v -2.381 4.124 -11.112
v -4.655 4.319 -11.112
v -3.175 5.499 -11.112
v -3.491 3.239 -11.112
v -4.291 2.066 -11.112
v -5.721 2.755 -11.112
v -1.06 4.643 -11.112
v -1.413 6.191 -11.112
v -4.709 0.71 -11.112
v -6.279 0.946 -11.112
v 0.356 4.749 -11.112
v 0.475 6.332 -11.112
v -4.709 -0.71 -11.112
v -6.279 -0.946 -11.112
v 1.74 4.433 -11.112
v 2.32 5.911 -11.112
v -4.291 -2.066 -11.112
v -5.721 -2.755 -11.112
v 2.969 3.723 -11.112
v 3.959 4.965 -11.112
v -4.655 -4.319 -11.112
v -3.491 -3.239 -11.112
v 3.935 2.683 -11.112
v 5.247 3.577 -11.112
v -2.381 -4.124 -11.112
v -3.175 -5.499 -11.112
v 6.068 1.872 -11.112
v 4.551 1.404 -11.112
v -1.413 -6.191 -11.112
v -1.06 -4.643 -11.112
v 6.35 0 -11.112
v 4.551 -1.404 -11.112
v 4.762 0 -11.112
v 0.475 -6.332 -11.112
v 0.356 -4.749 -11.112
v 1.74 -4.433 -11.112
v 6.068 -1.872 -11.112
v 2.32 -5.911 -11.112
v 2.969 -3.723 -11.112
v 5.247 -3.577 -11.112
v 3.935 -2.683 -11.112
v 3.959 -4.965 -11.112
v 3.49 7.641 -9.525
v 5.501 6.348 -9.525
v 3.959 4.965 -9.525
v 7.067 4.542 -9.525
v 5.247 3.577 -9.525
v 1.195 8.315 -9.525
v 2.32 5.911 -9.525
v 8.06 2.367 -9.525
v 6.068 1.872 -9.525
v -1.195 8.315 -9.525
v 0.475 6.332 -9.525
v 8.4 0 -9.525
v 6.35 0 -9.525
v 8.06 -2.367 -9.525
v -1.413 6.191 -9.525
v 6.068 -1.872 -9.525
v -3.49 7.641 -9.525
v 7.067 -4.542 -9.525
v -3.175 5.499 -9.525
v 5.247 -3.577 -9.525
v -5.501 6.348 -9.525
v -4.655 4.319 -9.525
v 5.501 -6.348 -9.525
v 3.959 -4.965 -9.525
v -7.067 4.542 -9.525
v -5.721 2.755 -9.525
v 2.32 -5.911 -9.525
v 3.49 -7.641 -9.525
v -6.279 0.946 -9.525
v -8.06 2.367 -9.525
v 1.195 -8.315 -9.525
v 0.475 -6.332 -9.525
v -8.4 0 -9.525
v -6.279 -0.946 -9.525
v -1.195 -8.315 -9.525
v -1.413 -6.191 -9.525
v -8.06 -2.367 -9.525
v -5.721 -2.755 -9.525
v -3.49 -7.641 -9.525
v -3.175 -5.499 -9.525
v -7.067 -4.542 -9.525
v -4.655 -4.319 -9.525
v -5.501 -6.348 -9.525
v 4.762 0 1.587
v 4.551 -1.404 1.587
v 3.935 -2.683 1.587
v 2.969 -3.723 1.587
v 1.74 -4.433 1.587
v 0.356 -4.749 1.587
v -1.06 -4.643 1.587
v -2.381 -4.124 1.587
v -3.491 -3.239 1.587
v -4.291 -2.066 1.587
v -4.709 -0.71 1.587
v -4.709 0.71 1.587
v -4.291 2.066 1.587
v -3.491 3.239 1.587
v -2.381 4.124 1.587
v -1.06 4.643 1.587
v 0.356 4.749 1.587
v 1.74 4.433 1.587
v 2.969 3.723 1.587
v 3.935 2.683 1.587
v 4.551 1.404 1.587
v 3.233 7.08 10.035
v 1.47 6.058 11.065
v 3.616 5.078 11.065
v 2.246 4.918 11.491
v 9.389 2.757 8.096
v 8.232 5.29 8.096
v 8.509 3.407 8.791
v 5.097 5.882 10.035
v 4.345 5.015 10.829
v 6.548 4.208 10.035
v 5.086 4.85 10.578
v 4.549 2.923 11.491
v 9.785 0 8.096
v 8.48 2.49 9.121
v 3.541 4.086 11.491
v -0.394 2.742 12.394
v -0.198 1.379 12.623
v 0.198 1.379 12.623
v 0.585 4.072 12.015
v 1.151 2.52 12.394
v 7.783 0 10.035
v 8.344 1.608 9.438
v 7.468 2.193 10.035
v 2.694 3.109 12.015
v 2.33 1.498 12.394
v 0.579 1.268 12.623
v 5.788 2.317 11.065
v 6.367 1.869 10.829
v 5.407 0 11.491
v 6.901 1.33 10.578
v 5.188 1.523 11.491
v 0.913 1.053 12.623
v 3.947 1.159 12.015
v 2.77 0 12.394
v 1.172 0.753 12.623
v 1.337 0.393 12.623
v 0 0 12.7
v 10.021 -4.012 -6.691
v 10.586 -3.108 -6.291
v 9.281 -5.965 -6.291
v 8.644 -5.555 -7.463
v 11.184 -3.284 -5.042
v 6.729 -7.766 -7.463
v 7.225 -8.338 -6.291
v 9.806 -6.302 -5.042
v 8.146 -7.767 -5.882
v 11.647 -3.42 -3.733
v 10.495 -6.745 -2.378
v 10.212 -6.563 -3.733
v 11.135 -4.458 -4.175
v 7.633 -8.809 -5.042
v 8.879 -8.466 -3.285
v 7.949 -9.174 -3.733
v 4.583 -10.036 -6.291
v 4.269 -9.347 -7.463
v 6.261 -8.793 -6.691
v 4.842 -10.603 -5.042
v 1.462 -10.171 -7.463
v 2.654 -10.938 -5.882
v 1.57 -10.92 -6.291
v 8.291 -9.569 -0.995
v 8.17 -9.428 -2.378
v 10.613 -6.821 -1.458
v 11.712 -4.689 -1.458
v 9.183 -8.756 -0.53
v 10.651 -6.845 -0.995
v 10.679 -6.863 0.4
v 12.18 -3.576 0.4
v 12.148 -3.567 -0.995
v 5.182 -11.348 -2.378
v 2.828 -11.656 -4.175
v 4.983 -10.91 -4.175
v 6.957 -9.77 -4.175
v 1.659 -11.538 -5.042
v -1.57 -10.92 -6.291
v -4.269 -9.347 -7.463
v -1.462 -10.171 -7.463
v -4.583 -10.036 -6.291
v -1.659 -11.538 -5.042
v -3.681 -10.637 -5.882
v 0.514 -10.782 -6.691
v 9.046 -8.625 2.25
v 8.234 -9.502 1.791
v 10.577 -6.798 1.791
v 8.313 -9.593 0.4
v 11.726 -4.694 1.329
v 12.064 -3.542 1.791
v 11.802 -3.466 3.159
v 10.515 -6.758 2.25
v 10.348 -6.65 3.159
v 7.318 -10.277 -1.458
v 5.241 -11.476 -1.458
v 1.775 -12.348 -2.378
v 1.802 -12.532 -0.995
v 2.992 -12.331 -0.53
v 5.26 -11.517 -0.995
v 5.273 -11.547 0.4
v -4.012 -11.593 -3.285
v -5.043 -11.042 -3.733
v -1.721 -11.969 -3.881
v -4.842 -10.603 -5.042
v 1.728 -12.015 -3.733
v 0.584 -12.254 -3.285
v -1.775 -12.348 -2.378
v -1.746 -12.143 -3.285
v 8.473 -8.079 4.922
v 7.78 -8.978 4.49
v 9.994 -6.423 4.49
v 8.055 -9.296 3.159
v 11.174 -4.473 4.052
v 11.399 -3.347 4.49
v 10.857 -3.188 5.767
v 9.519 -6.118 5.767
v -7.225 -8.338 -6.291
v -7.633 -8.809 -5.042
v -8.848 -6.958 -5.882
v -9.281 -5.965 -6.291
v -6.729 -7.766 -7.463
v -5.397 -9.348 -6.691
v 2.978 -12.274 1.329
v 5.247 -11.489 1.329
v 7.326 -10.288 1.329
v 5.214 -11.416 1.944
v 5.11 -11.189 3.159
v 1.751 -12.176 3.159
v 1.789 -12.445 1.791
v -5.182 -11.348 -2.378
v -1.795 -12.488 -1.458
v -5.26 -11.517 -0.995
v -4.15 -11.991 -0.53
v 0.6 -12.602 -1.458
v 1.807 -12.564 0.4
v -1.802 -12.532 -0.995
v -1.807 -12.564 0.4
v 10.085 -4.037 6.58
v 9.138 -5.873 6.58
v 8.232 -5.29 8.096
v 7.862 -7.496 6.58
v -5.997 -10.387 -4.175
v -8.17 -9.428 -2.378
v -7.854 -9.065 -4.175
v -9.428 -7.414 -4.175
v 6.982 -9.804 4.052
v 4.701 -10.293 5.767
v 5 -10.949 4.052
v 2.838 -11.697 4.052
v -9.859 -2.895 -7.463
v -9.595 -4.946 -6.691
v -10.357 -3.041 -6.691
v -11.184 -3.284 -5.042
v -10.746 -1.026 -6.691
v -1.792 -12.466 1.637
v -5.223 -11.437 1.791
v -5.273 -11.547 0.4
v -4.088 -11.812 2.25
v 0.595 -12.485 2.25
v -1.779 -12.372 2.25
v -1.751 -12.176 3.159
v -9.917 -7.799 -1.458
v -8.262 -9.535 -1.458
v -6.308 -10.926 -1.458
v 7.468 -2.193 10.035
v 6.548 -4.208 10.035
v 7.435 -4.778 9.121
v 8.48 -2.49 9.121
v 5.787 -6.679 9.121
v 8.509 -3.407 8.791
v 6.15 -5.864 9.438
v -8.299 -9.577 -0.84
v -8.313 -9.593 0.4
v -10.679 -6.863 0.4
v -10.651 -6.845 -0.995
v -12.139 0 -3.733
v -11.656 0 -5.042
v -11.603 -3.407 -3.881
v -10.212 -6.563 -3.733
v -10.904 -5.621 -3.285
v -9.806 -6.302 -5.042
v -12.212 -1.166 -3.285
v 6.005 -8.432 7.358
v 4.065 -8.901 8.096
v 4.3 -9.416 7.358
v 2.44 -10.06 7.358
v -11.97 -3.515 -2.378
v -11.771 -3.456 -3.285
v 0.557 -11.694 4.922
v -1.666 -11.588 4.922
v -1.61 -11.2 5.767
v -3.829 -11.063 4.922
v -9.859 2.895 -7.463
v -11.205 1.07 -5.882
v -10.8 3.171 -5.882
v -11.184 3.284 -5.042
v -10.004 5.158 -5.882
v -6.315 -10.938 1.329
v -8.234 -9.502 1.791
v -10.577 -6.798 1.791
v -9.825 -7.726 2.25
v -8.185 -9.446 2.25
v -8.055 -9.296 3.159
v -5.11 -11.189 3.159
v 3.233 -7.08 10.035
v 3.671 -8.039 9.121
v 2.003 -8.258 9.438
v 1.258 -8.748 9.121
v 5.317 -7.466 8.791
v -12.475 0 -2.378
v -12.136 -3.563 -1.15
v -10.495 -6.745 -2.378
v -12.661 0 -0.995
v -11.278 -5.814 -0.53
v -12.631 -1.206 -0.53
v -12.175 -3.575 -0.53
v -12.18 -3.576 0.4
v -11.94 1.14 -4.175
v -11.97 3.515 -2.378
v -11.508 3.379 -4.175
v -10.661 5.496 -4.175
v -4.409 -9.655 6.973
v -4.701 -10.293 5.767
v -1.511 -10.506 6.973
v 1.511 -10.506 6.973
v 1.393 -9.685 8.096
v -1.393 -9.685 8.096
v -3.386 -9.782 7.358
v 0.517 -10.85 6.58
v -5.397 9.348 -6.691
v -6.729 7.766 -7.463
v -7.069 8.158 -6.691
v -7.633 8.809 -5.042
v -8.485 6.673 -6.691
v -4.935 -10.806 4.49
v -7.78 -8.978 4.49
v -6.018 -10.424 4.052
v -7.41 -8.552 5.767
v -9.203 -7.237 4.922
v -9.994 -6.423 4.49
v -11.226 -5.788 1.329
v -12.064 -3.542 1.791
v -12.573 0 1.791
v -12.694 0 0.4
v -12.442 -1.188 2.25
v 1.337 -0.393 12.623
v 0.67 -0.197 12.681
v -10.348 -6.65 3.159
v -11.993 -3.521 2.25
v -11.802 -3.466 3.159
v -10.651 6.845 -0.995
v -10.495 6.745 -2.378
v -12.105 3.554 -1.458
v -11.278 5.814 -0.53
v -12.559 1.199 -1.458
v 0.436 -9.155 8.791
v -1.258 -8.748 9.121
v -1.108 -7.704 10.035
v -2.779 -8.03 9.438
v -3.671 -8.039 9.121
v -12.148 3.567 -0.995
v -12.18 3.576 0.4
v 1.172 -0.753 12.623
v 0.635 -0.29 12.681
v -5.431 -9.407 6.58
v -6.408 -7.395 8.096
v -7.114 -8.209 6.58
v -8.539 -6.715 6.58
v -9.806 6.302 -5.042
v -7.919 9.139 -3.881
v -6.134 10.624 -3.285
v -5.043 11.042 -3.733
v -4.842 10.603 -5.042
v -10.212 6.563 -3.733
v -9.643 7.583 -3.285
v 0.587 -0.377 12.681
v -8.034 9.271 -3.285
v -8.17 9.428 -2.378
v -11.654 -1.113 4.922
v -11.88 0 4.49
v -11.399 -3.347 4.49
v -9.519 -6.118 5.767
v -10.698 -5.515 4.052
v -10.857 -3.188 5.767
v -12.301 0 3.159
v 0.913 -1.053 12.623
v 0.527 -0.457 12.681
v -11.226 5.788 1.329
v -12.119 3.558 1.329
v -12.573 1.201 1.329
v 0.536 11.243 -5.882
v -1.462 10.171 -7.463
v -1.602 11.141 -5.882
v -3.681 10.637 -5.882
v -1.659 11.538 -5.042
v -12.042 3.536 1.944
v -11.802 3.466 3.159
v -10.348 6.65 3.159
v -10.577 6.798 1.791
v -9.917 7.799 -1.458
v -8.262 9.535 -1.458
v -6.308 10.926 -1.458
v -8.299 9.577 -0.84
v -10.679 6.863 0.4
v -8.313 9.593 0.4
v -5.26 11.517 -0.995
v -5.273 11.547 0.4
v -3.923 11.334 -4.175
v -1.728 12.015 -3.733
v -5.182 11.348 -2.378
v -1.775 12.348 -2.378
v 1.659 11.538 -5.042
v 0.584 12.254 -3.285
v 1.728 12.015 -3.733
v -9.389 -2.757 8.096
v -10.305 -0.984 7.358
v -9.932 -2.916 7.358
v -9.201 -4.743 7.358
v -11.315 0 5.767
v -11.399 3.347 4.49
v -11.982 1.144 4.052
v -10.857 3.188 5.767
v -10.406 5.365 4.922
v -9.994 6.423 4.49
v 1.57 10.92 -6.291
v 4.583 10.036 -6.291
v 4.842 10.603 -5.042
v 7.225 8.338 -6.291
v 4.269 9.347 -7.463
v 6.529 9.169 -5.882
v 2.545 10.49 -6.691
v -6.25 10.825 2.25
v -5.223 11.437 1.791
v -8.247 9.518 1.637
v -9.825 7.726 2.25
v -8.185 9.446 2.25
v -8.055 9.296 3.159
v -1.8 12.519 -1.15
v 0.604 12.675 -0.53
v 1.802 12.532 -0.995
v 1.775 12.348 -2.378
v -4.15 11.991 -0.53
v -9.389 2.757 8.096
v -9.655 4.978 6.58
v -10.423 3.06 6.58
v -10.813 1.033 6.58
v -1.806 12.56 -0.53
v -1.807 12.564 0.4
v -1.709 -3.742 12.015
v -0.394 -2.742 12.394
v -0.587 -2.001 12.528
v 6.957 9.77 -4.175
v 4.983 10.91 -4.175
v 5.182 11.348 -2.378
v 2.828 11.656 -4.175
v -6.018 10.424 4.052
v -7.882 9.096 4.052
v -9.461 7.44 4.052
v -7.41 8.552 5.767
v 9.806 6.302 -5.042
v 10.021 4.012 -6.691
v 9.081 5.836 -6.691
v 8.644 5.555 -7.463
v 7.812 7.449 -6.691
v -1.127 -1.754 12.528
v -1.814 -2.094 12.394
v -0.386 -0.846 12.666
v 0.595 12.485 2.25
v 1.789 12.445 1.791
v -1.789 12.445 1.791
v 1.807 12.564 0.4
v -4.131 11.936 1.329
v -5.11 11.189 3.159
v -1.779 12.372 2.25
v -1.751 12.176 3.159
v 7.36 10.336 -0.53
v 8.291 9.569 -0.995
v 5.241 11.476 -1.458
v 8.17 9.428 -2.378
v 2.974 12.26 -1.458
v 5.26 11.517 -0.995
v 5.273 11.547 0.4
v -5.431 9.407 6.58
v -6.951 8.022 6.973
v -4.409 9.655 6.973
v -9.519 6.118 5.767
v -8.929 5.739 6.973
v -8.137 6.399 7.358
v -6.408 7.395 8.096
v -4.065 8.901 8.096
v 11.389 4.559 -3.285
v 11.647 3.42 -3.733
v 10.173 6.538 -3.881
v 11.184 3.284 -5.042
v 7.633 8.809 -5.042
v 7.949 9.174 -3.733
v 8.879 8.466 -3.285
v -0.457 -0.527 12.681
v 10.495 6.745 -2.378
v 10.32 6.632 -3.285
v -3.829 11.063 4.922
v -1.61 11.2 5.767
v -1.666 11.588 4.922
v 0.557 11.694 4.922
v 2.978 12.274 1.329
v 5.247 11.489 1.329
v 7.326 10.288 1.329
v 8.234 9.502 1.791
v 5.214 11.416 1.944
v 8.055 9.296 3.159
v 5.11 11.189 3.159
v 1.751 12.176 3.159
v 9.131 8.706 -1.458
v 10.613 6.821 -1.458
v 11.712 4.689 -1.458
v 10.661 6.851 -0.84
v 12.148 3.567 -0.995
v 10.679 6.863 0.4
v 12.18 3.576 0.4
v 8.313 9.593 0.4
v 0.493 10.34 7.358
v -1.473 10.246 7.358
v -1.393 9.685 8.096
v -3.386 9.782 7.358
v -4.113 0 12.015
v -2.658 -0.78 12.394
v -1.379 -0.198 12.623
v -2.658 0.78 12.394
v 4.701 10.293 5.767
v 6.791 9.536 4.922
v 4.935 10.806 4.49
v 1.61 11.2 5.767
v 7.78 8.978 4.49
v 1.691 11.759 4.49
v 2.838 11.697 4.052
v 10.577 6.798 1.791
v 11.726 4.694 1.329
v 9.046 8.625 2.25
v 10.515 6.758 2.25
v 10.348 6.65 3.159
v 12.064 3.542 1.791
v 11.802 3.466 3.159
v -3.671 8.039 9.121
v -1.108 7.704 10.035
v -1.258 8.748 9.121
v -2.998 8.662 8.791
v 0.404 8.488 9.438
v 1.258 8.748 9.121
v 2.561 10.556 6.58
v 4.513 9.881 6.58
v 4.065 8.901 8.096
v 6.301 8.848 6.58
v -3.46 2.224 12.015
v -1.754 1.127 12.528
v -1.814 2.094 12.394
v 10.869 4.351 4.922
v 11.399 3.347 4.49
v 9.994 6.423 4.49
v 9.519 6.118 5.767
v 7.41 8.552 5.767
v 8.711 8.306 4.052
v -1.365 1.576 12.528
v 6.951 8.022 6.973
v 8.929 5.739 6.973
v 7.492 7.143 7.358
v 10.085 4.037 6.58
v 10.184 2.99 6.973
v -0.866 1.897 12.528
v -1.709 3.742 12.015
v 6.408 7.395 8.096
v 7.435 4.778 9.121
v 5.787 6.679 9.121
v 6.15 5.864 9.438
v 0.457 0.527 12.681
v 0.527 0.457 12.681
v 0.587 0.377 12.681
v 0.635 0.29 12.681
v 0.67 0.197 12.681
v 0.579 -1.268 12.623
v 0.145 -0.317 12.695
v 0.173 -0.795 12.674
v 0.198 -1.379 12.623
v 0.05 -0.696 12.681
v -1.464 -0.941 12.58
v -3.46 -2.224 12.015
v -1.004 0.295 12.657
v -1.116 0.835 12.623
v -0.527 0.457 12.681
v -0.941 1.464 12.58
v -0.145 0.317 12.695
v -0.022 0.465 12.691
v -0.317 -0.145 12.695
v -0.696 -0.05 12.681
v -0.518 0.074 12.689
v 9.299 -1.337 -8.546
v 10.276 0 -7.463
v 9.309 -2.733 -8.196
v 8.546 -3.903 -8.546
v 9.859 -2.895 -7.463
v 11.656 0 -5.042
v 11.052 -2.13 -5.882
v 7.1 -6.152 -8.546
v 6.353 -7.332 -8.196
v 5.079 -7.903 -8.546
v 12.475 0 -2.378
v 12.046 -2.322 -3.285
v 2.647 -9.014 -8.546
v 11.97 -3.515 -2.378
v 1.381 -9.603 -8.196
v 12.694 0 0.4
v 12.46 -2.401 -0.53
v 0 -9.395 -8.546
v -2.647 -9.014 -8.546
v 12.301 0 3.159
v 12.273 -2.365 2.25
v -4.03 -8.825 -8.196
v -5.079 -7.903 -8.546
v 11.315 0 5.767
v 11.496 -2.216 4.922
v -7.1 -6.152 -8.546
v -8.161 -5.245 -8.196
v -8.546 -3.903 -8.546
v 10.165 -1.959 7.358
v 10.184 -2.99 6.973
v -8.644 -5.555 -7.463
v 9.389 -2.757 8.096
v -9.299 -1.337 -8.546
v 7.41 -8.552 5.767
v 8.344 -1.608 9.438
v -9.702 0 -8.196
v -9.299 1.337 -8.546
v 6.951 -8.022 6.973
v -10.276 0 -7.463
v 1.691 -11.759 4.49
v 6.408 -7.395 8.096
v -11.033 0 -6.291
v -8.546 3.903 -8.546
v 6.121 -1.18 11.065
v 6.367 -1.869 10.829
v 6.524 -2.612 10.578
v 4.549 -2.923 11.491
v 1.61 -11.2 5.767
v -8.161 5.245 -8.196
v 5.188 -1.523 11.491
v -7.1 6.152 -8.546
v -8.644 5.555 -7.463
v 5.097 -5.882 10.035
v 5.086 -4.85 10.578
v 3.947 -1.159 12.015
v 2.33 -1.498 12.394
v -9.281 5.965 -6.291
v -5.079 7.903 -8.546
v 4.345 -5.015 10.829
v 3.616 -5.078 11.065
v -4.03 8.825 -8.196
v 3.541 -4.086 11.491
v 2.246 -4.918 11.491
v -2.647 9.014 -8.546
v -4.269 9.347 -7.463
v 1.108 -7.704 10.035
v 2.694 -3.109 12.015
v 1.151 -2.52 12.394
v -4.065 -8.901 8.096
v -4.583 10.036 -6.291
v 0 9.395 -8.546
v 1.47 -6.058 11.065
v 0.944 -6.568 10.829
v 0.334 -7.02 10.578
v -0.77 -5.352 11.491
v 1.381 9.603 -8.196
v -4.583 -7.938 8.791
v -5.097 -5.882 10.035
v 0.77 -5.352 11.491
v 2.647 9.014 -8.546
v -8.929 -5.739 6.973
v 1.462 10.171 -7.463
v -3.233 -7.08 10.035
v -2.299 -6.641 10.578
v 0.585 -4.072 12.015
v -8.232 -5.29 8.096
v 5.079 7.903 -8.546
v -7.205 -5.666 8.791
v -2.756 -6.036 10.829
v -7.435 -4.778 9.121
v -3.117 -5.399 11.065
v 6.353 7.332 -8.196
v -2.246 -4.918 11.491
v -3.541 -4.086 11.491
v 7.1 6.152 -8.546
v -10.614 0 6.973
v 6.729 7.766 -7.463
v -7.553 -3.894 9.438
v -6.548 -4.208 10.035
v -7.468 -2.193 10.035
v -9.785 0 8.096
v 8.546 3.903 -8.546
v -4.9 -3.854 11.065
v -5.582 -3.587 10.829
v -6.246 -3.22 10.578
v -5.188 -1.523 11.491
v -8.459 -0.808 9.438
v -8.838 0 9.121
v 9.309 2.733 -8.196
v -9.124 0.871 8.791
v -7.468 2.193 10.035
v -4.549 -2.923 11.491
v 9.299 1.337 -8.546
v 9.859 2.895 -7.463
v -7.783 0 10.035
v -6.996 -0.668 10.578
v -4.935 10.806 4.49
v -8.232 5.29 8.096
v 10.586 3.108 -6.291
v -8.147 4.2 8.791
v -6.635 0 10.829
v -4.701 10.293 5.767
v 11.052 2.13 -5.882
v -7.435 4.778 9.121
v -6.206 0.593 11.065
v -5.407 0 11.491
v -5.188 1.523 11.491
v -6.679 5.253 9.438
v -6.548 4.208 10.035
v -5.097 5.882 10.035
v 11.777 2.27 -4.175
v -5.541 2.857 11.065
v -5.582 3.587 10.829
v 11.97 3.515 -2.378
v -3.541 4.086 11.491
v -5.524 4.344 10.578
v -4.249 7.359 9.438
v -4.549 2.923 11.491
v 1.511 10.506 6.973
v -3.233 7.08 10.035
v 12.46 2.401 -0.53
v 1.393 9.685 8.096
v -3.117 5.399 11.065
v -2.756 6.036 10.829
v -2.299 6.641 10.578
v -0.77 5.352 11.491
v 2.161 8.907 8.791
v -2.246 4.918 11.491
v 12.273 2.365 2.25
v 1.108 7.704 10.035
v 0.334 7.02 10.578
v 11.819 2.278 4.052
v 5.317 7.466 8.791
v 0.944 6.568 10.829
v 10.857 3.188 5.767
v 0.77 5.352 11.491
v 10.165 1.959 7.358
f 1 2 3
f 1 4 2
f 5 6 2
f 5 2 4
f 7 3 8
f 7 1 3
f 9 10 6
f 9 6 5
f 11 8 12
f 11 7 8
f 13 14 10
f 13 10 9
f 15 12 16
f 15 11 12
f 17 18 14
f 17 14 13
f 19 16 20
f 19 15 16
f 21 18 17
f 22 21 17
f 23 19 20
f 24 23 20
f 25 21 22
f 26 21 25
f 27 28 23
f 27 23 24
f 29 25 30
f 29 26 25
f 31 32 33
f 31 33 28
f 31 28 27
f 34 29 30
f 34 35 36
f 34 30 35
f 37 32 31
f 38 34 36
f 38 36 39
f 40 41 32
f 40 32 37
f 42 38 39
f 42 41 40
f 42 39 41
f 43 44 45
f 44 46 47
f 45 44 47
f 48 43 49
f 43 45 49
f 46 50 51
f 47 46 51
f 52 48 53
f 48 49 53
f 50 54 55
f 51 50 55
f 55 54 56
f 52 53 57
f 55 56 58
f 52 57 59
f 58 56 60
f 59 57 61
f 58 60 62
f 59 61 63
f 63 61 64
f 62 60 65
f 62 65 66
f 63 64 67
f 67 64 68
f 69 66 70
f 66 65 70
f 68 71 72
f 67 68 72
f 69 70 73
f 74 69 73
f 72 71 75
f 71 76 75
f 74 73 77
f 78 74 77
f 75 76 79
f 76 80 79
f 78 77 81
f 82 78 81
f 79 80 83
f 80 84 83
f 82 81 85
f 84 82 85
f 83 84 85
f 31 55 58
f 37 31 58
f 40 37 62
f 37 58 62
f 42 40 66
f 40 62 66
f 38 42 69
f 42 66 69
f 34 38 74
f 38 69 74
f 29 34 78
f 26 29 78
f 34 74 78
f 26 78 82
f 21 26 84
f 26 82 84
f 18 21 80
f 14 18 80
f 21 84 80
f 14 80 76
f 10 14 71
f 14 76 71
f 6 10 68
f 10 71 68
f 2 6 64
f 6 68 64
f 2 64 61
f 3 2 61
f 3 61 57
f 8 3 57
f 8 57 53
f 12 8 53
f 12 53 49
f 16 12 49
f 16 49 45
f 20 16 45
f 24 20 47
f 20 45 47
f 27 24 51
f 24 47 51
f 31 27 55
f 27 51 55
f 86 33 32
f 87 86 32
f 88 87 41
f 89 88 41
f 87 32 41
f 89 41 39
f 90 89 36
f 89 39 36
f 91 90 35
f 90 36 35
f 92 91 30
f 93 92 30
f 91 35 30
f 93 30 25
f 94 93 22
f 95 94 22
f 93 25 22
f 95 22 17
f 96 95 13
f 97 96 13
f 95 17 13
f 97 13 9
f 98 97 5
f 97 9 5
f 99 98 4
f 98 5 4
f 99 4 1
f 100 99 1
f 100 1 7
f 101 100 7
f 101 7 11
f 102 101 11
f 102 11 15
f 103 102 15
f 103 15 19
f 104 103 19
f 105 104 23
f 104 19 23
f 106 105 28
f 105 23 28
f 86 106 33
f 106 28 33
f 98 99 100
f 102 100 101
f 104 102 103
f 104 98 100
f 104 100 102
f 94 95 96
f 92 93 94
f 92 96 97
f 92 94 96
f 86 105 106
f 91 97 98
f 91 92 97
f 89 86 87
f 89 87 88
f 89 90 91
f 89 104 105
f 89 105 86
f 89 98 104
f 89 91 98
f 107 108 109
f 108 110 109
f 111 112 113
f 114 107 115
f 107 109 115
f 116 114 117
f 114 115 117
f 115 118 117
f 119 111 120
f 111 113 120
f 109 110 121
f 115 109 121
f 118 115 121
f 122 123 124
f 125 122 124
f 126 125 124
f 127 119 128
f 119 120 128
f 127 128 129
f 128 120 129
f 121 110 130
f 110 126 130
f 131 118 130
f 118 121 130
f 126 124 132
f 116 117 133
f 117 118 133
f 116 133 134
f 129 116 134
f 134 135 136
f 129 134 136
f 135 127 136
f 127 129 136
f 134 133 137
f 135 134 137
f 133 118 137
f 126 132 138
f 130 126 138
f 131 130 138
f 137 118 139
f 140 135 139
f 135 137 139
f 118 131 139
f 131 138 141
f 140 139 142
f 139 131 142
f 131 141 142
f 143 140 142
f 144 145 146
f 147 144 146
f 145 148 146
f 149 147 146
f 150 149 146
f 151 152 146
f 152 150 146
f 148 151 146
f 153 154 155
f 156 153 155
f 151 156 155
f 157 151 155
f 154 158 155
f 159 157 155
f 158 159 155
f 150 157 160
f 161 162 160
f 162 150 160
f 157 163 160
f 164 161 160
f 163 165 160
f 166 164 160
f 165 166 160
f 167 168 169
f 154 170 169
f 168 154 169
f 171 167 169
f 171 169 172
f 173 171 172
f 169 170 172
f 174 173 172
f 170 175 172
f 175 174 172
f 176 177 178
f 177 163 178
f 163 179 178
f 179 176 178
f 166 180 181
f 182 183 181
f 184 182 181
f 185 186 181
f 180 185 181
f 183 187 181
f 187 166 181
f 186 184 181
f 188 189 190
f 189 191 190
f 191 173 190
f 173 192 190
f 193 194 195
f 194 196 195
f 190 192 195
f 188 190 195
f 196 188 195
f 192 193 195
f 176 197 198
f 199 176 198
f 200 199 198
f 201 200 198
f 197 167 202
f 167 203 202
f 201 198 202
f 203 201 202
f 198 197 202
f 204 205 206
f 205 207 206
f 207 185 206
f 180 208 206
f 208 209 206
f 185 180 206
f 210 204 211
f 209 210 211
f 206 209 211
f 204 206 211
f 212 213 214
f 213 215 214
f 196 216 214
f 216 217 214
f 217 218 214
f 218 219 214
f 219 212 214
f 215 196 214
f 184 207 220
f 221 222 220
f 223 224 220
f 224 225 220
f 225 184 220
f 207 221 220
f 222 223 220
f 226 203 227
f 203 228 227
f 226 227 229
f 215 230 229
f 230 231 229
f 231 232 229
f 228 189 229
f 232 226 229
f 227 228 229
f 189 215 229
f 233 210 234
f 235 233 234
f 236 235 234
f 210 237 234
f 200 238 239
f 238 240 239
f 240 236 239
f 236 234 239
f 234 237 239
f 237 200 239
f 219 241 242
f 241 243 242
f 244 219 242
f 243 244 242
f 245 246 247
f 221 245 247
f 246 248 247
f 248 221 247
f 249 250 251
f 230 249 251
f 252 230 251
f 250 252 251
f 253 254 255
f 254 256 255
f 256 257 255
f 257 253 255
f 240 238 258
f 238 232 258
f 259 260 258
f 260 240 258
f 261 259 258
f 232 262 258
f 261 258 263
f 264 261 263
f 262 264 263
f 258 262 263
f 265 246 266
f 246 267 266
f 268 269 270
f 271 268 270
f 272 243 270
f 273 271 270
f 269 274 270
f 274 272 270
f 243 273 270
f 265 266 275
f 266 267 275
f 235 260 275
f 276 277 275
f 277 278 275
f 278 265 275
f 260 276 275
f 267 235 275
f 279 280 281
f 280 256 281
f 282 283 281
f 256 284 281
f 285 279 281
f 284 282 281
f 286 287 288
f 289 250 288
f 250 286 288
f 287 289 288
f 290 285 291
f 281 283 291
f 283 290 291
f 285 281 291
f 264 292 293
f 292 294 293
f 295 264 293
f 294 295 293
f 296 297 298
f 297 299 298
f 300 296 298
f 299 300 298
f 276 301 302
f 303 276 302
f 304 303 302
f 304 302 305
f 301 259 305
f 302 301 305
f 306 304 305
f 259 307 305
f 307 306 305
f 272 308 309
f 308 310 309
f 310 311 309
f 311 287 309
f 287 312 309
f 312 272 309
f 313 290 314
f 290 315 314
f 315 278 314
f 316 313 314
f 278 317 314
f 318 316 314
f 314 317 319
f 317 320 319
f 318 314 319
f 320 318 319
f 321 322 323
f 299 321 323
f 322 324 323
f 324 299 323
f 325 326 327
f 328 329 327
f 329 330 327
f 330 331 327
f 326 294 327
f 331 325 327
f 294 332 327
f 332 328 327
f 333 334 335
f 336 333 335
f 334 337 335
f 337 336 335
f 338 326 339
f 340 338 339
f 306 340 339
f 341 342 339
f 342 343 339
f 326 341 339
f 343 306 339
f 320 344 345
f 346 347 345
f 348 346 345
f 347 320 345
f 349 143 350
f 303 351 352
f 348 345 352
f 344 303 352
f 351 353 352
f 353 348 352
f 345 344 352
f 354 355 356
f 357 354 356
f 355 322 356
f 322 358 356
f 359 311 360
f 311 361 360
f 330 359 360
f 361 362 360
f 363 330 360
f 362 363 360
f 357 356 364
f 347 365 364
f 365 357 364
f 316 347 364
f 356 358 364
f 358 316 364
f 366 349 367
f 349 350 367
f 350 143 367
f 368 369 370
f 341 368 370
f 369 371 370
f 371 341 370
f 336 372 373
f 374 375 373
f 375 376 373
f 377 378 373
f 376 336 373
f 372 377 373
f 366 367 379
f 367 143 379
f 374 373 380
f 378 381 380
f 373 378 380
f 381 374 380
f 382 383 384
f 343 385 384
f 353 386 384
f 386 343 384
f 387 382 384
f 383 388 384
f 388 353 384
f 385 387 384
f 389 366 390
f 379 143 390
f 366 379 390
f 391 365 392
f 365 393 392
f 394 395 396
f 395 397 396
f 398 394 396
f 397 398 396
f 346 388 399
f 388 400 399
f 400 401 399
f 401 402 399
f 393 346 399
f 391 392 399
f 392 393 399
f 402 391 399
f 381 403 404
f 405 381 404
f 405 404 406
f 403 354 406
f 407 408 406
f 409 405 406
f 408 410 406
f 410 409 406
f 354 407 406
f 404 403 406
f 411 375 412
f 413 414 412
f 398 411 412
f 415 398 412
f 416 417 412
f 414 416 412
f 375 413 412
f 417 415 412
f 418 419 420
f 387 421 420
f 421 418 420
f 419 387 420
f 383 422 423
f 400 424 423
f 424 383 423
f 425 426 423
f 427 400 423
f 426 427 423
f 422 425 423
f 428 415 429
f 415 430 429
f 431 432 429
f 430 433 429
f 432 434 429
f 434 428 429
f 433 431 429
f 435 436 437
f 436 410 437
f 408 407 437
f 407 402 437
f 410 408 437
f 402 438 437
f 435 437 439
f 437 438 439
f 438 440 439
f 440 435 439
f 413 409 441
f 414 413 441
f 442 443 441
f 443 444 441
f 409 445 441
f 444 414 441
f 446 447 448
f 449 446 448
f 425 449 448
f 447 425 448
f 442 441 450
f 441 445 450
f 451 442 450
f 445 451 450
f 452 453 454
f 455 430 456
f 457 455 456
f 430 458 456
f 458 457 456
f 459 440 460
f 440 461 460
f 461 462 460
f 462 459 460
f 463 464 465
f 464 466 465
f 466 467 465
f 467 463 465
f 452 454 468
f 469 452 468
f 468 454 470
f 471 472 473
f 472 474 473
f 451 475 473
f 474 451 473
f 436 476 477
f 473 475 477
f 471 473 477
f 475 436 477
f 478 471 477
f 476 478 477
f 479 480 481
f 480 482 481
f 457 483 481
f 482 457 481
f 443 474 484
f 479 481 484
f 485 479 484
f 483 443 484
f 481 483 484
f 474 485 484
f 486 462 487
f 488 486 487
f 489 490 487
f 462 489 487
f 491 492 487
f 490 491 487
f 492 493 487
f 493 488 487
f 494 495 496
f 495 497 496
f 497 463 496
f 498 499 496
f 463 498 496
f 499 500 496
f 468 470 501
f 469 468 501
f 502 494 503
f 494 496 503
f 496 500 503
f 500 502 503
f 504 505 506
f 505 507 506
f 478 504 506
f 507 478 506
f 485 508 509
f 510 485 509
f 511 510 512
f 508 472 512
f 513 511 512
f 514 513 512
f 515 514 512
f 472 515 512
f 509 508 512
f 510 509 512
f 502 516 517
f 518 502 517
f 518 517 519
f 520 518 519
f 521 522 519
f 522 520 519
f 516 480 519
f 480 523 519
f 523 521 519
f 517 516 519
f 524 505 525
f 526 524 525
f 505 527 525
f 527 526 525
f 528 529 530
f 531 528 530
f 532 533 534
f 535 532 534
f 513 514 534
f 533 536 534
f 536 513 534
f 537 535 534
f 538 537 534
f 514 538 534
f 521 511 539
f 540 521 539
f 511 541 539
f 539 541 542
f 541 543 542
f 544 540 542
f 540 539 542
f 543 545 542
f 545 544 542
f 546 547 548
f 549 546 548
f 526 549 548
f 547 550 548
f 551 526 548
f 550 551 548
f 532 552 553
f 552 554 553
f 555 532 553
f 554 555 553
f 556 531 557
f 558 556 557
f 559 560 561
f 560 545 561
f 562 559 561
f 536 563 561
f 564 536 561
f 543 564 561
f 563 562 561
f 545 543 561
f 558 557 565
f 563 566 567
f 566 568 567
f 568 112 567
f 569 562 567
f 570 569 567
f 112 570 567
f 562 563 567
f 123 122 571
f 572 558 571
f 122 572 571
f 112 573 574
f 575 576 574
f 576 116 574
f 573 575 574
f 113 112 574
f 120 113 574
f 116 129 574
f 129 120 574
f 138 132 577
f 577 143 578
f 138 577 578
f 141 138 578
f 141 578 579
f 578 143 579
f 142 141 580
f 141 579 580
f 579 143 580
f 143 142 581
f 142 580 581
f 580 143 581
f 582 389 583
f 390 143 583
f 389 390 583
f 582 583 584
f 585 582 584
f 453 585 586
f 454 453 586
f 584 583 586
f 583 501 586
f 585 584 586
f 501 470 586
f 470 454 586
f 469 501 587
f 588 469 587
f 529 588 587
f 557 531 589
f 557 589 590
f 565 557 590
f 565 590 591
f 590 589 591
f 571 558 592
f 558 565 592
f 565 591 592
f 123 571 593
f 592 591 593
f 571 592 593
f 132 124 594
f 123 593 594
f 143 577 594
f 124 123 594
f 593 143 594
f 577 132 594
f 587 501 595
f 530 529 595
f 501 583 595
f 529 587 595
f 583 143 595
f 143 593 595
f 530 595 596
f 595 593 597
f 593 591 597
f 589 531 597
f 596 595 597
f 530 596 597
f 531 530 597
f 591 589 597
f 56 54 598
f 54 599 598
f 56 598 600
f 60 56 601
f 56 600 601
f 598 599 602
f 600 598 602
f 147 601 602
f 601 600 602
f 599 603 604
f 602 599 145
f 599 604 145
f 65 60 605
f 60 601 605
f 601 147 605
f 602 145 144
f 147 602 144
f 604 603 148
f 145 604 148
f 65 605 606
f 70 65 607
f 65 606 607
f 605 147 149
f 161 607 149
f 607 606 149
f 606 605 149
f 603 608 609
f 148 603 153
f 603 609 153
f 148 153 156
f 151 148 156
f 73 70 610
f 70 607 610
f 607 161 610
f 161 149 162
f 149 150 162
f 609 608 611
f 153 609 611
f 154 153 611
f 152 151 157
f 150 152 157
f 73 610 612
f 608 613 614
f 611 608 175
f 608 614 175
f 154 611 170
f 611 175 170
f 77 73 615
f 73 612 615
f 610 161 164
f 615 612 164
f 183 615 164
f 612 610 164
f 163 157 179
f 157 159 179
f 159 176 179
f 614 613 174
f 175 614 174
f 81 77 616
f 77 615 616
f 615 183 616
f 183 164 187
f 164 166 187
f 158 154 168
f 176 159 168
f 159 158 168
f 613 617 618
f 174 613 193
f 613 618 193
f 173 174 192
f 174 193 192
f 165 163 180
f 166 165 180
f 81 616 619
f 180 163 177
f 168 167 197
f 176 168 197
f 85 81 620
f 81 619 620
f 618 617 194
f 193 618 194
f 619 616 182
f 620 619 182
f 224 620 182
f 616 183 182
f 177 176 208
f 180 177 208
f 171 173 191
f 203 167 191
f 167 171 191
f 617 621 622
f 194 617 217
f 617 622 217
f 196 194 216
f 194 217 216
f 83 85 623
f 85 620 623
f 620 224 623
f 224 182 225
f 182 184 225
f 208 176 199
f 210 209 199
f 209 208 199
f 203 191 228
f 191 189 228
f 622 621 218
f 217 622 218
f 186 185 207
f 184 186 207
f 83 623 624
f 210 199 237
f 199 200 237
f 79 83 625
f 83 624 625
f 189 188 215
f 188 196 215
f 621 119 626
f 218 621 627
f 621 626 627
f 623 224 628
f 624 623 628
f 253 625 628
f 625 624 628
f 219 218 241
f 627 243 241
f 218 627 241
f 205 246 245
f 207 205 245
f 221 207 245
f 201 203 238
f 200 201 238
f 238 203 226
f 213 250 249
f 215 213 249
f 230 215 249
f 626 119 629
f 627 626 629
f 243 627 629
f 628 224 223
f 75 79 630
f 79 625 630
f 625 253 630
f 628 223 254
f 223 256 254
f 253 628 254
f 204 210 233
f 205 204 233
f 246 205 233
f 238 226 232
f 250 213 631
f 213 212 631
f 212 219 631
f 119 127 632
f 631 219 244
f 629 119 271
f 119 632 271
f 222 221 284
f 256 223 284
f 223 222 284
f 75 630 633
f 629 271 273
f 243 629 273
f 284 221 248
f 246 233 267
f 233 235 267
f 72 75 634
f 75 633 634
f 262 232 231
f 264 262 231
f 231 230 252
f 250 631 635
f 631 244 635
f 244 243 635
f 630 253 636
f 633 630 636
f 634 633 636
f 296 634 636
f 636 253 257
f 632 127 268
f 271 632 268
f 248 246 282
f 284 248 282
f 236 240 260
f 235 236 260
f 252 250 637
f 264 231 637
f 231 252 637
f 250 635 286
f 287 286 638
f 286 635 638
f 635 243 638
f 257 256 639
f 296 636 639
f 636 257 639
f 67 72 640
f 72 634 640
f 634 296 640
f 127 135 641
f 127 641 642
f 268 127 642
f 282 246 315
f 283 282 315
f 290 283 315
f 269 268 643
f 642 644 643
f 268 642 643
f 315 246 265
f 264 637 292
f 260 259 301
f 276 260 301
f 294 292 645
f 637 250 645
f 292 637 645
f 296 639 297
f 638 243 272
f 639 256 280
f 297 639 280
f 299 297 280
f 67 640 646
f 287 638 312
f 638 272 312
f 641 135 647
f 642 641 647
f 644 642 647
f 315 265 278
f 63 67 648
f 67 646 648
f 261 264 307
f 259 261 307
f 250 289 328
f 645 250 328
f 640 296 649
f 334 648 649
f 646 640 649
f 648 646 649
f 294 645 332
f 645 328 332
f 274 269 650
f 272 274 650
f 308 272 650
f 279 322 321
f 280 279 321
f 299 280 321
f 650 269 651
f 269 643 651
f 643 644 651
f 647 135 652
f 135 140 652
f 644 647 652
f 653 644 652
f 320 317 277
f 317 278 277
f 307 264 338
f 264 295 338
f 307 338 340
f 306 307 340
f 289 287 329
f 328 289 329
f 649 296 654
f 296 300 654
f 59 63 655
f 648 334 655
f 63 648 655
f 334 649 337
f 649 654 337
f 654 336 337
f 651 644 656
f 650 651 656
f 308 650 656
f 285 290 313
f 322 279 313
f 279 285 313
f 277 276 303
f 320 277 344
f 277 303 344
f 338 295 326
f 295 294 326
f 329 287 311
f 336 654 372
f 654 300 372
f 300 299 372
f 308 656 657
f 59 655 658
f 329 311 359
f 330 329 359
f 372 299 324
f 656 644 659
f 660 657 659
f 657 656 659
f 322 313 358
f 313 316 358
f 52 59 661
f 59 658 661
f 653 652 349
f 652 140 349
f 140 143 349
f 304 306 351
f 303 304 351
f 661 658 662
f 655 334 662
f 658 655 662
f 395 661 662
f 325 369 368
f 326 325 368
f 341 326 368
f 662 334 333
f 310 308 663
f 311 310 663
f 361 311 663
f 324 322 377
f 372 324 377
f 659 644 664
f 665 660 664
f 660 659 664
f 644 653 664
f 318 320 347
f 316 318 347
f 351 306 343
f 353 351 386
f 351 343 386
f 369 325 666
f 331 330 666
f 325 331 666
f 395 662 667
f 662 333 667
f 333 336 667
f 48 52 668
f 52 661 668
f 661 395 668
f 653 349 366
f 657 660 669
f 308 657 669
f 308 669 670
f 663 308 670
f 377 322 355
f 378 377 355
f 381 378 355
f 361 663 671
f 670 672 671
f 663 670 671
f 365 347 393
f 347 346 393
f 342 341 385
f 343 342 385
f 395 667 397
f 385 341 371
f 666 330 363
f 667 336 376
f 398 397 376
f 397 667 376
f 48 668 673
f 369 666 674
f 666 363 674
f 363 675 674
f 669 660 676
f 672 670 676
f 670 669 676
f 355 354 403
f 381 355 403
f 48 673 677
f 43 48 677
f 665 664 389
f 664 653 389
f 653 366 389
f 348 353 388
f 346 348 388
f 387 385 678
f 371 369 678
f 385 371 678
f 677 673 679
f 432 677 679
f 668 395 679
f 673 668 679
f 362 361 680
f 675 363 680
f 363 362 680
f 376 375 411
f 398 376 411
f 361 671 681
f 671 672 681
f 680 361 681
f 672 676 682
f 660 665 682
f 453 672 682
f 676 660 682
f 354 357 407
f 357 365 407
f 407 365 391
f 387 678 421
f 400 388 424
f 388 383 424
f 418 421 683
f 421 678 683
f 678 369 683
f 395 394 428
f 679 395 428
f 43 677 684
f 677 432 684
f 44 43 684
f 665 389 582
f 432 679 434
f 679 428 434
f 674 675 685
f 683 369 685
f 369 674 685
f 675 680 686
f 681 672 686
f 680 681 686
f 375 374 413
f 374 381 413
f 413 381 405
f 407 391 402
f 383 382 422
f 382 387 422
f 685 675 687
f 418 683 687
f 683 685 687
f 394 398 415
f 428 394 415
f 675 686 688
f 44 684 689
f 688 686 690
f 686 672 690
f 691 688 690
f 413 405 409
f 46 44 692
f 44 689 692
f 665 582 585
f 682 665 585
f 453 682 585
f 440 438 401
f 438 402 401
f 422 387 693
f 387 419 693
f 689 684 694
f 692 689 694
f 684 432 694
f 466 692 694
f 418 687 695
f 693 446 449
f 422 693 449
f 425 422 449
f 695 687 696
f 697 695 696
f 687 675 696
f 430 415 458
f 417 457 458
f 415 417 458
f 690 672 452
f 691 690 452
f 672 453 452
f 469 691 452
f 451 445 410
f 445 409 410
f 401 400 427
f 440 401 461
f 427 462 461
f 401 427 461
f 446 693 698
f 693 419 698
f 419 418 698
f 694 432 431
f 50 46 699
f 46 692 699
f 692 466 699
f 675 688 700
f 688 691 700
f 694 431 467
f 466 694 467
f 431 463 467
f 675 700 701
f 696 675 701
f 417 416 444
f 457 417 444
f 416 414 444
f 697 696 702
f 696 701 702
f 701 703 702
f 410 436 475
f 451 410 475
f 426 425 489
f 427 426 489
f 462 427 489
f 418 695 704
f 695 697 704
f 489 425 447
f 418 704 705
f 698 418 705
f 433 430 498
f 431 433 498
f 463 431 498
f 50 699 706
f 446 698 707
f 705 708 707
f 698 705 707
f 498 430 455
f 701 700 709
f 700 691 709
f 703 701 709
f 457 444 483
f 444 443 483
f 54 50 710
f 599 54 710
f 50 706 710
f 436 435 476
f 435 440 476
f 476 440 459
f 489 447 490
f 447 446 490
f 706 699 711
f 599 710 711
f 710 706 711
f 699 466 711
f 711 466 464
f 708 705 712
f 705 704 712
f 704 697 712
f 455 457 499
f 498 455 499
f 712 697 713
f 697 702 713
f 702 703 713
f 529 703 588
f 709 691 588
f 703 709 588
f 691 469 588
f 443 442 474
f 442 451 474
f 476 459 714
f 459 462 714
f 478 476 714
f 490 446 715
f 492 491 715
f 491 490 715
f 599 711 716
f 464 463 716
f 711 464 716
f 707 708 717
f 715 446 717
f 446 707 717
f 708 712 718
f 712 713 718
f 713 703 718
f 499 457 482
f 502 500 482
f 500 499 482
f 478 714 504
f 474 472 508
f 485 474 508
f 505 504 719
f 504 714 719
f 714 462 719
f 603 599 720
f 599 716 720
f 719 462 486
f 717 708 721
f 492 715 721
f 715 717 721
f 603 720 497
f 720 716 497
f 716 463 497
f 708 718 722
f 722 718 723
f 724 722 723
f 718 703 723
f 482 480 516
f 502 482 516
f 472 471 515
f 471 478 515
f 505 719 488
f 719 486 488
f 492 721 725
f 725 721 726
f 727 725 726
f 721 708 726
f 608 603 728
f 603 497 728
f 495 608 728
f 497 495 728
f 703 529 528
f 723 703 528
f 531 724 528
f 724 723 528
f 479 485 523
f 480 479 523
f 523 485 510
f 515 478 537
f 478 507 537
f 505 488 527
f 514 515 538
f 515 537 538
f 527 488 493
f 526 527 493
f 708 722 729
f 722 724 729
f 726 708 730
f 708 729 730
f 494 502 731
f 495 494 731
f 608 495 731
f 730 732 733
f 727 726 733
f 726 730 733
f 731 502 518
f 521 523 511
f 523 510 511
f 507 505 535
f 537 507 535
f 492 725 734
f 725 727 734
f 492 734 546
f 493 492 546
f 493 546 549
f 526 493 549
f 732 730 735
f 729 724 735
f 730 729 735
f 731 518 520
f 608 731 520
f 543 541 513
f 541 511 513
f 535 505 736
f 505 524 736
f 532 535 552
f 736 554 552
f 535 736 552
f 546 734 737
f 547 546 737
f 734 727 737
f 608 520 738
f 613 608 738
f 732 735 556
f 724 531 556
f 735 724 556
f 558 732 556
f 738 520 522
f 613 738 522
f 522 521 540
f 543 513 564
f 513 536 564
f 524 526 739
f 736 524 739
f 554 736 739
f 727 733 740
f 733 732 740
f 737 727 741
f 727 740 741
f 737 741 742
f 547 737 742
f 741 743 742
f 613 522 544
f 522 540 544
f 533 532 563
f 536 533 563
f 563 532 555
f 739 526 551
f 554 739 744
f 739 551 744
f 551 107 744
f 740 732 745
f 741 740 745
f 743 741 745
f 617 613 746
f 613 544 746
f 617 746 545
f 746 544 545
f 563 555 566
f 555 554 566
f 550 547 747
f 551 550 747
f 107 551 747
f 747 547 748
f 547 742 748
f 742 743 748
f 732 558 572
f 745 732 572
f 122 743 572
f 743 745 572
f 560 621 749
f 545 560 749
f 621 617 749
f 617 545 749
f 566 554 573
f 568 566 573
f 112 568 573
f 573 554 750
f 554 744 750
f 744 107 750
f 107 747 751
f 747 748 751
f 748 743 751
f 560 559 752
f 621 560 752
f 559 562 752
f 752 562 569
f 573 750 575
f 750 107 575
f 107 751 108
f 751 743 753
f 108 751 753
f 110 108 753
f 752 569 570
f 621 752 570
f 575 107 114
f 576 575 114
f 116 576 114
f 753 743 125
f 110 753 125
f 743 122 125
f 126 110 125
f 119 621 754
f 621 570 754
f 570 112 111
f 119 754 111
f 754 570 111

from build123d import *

# Parameters (mm, degrees)
F2_R     = 6.35
F3_DEPTH = 1.5875
F4_R     = 4.7625
F5_DEPTH = 12.7


with BuildPart() as f1:
    # F0 (on Front) → F1 (revolve)
    with BuildSketch(Plane.XZ):
        with BuildLine():
            ThreePointArc((8.40026, -9.525), (11.879762, 4.490128), (0, 12.7))
            Line((0, 12.7), (0, -9.525))
            Line((0, -9.525), (8.40026, -9.525))
        make_face()
    revolve(axis=Axis((0, 0, 1.5875), (0, 0, -1)))

    # F2 (on face) → F3 (join)
    with BuildSketch(Plane(origin=(0, 0, -9.525), x_dir=(1, 0, 0), z_dir=(0, 0, -1))):
        Circle(F2_R)
    extrude(amount=F3_DEPTH)

    # F4 (on face) → F5 (cut)
    with BuildSketch(Plane(origin=(0, 0, -11.1125), x_dir=(1, 0, 0), z_dir=(0, 0, -1))):
        Circle(F4_R)
    extrude(amount=-F5_DEPTH, mode=Mode.SUBTRACT)


solid = f1.part
